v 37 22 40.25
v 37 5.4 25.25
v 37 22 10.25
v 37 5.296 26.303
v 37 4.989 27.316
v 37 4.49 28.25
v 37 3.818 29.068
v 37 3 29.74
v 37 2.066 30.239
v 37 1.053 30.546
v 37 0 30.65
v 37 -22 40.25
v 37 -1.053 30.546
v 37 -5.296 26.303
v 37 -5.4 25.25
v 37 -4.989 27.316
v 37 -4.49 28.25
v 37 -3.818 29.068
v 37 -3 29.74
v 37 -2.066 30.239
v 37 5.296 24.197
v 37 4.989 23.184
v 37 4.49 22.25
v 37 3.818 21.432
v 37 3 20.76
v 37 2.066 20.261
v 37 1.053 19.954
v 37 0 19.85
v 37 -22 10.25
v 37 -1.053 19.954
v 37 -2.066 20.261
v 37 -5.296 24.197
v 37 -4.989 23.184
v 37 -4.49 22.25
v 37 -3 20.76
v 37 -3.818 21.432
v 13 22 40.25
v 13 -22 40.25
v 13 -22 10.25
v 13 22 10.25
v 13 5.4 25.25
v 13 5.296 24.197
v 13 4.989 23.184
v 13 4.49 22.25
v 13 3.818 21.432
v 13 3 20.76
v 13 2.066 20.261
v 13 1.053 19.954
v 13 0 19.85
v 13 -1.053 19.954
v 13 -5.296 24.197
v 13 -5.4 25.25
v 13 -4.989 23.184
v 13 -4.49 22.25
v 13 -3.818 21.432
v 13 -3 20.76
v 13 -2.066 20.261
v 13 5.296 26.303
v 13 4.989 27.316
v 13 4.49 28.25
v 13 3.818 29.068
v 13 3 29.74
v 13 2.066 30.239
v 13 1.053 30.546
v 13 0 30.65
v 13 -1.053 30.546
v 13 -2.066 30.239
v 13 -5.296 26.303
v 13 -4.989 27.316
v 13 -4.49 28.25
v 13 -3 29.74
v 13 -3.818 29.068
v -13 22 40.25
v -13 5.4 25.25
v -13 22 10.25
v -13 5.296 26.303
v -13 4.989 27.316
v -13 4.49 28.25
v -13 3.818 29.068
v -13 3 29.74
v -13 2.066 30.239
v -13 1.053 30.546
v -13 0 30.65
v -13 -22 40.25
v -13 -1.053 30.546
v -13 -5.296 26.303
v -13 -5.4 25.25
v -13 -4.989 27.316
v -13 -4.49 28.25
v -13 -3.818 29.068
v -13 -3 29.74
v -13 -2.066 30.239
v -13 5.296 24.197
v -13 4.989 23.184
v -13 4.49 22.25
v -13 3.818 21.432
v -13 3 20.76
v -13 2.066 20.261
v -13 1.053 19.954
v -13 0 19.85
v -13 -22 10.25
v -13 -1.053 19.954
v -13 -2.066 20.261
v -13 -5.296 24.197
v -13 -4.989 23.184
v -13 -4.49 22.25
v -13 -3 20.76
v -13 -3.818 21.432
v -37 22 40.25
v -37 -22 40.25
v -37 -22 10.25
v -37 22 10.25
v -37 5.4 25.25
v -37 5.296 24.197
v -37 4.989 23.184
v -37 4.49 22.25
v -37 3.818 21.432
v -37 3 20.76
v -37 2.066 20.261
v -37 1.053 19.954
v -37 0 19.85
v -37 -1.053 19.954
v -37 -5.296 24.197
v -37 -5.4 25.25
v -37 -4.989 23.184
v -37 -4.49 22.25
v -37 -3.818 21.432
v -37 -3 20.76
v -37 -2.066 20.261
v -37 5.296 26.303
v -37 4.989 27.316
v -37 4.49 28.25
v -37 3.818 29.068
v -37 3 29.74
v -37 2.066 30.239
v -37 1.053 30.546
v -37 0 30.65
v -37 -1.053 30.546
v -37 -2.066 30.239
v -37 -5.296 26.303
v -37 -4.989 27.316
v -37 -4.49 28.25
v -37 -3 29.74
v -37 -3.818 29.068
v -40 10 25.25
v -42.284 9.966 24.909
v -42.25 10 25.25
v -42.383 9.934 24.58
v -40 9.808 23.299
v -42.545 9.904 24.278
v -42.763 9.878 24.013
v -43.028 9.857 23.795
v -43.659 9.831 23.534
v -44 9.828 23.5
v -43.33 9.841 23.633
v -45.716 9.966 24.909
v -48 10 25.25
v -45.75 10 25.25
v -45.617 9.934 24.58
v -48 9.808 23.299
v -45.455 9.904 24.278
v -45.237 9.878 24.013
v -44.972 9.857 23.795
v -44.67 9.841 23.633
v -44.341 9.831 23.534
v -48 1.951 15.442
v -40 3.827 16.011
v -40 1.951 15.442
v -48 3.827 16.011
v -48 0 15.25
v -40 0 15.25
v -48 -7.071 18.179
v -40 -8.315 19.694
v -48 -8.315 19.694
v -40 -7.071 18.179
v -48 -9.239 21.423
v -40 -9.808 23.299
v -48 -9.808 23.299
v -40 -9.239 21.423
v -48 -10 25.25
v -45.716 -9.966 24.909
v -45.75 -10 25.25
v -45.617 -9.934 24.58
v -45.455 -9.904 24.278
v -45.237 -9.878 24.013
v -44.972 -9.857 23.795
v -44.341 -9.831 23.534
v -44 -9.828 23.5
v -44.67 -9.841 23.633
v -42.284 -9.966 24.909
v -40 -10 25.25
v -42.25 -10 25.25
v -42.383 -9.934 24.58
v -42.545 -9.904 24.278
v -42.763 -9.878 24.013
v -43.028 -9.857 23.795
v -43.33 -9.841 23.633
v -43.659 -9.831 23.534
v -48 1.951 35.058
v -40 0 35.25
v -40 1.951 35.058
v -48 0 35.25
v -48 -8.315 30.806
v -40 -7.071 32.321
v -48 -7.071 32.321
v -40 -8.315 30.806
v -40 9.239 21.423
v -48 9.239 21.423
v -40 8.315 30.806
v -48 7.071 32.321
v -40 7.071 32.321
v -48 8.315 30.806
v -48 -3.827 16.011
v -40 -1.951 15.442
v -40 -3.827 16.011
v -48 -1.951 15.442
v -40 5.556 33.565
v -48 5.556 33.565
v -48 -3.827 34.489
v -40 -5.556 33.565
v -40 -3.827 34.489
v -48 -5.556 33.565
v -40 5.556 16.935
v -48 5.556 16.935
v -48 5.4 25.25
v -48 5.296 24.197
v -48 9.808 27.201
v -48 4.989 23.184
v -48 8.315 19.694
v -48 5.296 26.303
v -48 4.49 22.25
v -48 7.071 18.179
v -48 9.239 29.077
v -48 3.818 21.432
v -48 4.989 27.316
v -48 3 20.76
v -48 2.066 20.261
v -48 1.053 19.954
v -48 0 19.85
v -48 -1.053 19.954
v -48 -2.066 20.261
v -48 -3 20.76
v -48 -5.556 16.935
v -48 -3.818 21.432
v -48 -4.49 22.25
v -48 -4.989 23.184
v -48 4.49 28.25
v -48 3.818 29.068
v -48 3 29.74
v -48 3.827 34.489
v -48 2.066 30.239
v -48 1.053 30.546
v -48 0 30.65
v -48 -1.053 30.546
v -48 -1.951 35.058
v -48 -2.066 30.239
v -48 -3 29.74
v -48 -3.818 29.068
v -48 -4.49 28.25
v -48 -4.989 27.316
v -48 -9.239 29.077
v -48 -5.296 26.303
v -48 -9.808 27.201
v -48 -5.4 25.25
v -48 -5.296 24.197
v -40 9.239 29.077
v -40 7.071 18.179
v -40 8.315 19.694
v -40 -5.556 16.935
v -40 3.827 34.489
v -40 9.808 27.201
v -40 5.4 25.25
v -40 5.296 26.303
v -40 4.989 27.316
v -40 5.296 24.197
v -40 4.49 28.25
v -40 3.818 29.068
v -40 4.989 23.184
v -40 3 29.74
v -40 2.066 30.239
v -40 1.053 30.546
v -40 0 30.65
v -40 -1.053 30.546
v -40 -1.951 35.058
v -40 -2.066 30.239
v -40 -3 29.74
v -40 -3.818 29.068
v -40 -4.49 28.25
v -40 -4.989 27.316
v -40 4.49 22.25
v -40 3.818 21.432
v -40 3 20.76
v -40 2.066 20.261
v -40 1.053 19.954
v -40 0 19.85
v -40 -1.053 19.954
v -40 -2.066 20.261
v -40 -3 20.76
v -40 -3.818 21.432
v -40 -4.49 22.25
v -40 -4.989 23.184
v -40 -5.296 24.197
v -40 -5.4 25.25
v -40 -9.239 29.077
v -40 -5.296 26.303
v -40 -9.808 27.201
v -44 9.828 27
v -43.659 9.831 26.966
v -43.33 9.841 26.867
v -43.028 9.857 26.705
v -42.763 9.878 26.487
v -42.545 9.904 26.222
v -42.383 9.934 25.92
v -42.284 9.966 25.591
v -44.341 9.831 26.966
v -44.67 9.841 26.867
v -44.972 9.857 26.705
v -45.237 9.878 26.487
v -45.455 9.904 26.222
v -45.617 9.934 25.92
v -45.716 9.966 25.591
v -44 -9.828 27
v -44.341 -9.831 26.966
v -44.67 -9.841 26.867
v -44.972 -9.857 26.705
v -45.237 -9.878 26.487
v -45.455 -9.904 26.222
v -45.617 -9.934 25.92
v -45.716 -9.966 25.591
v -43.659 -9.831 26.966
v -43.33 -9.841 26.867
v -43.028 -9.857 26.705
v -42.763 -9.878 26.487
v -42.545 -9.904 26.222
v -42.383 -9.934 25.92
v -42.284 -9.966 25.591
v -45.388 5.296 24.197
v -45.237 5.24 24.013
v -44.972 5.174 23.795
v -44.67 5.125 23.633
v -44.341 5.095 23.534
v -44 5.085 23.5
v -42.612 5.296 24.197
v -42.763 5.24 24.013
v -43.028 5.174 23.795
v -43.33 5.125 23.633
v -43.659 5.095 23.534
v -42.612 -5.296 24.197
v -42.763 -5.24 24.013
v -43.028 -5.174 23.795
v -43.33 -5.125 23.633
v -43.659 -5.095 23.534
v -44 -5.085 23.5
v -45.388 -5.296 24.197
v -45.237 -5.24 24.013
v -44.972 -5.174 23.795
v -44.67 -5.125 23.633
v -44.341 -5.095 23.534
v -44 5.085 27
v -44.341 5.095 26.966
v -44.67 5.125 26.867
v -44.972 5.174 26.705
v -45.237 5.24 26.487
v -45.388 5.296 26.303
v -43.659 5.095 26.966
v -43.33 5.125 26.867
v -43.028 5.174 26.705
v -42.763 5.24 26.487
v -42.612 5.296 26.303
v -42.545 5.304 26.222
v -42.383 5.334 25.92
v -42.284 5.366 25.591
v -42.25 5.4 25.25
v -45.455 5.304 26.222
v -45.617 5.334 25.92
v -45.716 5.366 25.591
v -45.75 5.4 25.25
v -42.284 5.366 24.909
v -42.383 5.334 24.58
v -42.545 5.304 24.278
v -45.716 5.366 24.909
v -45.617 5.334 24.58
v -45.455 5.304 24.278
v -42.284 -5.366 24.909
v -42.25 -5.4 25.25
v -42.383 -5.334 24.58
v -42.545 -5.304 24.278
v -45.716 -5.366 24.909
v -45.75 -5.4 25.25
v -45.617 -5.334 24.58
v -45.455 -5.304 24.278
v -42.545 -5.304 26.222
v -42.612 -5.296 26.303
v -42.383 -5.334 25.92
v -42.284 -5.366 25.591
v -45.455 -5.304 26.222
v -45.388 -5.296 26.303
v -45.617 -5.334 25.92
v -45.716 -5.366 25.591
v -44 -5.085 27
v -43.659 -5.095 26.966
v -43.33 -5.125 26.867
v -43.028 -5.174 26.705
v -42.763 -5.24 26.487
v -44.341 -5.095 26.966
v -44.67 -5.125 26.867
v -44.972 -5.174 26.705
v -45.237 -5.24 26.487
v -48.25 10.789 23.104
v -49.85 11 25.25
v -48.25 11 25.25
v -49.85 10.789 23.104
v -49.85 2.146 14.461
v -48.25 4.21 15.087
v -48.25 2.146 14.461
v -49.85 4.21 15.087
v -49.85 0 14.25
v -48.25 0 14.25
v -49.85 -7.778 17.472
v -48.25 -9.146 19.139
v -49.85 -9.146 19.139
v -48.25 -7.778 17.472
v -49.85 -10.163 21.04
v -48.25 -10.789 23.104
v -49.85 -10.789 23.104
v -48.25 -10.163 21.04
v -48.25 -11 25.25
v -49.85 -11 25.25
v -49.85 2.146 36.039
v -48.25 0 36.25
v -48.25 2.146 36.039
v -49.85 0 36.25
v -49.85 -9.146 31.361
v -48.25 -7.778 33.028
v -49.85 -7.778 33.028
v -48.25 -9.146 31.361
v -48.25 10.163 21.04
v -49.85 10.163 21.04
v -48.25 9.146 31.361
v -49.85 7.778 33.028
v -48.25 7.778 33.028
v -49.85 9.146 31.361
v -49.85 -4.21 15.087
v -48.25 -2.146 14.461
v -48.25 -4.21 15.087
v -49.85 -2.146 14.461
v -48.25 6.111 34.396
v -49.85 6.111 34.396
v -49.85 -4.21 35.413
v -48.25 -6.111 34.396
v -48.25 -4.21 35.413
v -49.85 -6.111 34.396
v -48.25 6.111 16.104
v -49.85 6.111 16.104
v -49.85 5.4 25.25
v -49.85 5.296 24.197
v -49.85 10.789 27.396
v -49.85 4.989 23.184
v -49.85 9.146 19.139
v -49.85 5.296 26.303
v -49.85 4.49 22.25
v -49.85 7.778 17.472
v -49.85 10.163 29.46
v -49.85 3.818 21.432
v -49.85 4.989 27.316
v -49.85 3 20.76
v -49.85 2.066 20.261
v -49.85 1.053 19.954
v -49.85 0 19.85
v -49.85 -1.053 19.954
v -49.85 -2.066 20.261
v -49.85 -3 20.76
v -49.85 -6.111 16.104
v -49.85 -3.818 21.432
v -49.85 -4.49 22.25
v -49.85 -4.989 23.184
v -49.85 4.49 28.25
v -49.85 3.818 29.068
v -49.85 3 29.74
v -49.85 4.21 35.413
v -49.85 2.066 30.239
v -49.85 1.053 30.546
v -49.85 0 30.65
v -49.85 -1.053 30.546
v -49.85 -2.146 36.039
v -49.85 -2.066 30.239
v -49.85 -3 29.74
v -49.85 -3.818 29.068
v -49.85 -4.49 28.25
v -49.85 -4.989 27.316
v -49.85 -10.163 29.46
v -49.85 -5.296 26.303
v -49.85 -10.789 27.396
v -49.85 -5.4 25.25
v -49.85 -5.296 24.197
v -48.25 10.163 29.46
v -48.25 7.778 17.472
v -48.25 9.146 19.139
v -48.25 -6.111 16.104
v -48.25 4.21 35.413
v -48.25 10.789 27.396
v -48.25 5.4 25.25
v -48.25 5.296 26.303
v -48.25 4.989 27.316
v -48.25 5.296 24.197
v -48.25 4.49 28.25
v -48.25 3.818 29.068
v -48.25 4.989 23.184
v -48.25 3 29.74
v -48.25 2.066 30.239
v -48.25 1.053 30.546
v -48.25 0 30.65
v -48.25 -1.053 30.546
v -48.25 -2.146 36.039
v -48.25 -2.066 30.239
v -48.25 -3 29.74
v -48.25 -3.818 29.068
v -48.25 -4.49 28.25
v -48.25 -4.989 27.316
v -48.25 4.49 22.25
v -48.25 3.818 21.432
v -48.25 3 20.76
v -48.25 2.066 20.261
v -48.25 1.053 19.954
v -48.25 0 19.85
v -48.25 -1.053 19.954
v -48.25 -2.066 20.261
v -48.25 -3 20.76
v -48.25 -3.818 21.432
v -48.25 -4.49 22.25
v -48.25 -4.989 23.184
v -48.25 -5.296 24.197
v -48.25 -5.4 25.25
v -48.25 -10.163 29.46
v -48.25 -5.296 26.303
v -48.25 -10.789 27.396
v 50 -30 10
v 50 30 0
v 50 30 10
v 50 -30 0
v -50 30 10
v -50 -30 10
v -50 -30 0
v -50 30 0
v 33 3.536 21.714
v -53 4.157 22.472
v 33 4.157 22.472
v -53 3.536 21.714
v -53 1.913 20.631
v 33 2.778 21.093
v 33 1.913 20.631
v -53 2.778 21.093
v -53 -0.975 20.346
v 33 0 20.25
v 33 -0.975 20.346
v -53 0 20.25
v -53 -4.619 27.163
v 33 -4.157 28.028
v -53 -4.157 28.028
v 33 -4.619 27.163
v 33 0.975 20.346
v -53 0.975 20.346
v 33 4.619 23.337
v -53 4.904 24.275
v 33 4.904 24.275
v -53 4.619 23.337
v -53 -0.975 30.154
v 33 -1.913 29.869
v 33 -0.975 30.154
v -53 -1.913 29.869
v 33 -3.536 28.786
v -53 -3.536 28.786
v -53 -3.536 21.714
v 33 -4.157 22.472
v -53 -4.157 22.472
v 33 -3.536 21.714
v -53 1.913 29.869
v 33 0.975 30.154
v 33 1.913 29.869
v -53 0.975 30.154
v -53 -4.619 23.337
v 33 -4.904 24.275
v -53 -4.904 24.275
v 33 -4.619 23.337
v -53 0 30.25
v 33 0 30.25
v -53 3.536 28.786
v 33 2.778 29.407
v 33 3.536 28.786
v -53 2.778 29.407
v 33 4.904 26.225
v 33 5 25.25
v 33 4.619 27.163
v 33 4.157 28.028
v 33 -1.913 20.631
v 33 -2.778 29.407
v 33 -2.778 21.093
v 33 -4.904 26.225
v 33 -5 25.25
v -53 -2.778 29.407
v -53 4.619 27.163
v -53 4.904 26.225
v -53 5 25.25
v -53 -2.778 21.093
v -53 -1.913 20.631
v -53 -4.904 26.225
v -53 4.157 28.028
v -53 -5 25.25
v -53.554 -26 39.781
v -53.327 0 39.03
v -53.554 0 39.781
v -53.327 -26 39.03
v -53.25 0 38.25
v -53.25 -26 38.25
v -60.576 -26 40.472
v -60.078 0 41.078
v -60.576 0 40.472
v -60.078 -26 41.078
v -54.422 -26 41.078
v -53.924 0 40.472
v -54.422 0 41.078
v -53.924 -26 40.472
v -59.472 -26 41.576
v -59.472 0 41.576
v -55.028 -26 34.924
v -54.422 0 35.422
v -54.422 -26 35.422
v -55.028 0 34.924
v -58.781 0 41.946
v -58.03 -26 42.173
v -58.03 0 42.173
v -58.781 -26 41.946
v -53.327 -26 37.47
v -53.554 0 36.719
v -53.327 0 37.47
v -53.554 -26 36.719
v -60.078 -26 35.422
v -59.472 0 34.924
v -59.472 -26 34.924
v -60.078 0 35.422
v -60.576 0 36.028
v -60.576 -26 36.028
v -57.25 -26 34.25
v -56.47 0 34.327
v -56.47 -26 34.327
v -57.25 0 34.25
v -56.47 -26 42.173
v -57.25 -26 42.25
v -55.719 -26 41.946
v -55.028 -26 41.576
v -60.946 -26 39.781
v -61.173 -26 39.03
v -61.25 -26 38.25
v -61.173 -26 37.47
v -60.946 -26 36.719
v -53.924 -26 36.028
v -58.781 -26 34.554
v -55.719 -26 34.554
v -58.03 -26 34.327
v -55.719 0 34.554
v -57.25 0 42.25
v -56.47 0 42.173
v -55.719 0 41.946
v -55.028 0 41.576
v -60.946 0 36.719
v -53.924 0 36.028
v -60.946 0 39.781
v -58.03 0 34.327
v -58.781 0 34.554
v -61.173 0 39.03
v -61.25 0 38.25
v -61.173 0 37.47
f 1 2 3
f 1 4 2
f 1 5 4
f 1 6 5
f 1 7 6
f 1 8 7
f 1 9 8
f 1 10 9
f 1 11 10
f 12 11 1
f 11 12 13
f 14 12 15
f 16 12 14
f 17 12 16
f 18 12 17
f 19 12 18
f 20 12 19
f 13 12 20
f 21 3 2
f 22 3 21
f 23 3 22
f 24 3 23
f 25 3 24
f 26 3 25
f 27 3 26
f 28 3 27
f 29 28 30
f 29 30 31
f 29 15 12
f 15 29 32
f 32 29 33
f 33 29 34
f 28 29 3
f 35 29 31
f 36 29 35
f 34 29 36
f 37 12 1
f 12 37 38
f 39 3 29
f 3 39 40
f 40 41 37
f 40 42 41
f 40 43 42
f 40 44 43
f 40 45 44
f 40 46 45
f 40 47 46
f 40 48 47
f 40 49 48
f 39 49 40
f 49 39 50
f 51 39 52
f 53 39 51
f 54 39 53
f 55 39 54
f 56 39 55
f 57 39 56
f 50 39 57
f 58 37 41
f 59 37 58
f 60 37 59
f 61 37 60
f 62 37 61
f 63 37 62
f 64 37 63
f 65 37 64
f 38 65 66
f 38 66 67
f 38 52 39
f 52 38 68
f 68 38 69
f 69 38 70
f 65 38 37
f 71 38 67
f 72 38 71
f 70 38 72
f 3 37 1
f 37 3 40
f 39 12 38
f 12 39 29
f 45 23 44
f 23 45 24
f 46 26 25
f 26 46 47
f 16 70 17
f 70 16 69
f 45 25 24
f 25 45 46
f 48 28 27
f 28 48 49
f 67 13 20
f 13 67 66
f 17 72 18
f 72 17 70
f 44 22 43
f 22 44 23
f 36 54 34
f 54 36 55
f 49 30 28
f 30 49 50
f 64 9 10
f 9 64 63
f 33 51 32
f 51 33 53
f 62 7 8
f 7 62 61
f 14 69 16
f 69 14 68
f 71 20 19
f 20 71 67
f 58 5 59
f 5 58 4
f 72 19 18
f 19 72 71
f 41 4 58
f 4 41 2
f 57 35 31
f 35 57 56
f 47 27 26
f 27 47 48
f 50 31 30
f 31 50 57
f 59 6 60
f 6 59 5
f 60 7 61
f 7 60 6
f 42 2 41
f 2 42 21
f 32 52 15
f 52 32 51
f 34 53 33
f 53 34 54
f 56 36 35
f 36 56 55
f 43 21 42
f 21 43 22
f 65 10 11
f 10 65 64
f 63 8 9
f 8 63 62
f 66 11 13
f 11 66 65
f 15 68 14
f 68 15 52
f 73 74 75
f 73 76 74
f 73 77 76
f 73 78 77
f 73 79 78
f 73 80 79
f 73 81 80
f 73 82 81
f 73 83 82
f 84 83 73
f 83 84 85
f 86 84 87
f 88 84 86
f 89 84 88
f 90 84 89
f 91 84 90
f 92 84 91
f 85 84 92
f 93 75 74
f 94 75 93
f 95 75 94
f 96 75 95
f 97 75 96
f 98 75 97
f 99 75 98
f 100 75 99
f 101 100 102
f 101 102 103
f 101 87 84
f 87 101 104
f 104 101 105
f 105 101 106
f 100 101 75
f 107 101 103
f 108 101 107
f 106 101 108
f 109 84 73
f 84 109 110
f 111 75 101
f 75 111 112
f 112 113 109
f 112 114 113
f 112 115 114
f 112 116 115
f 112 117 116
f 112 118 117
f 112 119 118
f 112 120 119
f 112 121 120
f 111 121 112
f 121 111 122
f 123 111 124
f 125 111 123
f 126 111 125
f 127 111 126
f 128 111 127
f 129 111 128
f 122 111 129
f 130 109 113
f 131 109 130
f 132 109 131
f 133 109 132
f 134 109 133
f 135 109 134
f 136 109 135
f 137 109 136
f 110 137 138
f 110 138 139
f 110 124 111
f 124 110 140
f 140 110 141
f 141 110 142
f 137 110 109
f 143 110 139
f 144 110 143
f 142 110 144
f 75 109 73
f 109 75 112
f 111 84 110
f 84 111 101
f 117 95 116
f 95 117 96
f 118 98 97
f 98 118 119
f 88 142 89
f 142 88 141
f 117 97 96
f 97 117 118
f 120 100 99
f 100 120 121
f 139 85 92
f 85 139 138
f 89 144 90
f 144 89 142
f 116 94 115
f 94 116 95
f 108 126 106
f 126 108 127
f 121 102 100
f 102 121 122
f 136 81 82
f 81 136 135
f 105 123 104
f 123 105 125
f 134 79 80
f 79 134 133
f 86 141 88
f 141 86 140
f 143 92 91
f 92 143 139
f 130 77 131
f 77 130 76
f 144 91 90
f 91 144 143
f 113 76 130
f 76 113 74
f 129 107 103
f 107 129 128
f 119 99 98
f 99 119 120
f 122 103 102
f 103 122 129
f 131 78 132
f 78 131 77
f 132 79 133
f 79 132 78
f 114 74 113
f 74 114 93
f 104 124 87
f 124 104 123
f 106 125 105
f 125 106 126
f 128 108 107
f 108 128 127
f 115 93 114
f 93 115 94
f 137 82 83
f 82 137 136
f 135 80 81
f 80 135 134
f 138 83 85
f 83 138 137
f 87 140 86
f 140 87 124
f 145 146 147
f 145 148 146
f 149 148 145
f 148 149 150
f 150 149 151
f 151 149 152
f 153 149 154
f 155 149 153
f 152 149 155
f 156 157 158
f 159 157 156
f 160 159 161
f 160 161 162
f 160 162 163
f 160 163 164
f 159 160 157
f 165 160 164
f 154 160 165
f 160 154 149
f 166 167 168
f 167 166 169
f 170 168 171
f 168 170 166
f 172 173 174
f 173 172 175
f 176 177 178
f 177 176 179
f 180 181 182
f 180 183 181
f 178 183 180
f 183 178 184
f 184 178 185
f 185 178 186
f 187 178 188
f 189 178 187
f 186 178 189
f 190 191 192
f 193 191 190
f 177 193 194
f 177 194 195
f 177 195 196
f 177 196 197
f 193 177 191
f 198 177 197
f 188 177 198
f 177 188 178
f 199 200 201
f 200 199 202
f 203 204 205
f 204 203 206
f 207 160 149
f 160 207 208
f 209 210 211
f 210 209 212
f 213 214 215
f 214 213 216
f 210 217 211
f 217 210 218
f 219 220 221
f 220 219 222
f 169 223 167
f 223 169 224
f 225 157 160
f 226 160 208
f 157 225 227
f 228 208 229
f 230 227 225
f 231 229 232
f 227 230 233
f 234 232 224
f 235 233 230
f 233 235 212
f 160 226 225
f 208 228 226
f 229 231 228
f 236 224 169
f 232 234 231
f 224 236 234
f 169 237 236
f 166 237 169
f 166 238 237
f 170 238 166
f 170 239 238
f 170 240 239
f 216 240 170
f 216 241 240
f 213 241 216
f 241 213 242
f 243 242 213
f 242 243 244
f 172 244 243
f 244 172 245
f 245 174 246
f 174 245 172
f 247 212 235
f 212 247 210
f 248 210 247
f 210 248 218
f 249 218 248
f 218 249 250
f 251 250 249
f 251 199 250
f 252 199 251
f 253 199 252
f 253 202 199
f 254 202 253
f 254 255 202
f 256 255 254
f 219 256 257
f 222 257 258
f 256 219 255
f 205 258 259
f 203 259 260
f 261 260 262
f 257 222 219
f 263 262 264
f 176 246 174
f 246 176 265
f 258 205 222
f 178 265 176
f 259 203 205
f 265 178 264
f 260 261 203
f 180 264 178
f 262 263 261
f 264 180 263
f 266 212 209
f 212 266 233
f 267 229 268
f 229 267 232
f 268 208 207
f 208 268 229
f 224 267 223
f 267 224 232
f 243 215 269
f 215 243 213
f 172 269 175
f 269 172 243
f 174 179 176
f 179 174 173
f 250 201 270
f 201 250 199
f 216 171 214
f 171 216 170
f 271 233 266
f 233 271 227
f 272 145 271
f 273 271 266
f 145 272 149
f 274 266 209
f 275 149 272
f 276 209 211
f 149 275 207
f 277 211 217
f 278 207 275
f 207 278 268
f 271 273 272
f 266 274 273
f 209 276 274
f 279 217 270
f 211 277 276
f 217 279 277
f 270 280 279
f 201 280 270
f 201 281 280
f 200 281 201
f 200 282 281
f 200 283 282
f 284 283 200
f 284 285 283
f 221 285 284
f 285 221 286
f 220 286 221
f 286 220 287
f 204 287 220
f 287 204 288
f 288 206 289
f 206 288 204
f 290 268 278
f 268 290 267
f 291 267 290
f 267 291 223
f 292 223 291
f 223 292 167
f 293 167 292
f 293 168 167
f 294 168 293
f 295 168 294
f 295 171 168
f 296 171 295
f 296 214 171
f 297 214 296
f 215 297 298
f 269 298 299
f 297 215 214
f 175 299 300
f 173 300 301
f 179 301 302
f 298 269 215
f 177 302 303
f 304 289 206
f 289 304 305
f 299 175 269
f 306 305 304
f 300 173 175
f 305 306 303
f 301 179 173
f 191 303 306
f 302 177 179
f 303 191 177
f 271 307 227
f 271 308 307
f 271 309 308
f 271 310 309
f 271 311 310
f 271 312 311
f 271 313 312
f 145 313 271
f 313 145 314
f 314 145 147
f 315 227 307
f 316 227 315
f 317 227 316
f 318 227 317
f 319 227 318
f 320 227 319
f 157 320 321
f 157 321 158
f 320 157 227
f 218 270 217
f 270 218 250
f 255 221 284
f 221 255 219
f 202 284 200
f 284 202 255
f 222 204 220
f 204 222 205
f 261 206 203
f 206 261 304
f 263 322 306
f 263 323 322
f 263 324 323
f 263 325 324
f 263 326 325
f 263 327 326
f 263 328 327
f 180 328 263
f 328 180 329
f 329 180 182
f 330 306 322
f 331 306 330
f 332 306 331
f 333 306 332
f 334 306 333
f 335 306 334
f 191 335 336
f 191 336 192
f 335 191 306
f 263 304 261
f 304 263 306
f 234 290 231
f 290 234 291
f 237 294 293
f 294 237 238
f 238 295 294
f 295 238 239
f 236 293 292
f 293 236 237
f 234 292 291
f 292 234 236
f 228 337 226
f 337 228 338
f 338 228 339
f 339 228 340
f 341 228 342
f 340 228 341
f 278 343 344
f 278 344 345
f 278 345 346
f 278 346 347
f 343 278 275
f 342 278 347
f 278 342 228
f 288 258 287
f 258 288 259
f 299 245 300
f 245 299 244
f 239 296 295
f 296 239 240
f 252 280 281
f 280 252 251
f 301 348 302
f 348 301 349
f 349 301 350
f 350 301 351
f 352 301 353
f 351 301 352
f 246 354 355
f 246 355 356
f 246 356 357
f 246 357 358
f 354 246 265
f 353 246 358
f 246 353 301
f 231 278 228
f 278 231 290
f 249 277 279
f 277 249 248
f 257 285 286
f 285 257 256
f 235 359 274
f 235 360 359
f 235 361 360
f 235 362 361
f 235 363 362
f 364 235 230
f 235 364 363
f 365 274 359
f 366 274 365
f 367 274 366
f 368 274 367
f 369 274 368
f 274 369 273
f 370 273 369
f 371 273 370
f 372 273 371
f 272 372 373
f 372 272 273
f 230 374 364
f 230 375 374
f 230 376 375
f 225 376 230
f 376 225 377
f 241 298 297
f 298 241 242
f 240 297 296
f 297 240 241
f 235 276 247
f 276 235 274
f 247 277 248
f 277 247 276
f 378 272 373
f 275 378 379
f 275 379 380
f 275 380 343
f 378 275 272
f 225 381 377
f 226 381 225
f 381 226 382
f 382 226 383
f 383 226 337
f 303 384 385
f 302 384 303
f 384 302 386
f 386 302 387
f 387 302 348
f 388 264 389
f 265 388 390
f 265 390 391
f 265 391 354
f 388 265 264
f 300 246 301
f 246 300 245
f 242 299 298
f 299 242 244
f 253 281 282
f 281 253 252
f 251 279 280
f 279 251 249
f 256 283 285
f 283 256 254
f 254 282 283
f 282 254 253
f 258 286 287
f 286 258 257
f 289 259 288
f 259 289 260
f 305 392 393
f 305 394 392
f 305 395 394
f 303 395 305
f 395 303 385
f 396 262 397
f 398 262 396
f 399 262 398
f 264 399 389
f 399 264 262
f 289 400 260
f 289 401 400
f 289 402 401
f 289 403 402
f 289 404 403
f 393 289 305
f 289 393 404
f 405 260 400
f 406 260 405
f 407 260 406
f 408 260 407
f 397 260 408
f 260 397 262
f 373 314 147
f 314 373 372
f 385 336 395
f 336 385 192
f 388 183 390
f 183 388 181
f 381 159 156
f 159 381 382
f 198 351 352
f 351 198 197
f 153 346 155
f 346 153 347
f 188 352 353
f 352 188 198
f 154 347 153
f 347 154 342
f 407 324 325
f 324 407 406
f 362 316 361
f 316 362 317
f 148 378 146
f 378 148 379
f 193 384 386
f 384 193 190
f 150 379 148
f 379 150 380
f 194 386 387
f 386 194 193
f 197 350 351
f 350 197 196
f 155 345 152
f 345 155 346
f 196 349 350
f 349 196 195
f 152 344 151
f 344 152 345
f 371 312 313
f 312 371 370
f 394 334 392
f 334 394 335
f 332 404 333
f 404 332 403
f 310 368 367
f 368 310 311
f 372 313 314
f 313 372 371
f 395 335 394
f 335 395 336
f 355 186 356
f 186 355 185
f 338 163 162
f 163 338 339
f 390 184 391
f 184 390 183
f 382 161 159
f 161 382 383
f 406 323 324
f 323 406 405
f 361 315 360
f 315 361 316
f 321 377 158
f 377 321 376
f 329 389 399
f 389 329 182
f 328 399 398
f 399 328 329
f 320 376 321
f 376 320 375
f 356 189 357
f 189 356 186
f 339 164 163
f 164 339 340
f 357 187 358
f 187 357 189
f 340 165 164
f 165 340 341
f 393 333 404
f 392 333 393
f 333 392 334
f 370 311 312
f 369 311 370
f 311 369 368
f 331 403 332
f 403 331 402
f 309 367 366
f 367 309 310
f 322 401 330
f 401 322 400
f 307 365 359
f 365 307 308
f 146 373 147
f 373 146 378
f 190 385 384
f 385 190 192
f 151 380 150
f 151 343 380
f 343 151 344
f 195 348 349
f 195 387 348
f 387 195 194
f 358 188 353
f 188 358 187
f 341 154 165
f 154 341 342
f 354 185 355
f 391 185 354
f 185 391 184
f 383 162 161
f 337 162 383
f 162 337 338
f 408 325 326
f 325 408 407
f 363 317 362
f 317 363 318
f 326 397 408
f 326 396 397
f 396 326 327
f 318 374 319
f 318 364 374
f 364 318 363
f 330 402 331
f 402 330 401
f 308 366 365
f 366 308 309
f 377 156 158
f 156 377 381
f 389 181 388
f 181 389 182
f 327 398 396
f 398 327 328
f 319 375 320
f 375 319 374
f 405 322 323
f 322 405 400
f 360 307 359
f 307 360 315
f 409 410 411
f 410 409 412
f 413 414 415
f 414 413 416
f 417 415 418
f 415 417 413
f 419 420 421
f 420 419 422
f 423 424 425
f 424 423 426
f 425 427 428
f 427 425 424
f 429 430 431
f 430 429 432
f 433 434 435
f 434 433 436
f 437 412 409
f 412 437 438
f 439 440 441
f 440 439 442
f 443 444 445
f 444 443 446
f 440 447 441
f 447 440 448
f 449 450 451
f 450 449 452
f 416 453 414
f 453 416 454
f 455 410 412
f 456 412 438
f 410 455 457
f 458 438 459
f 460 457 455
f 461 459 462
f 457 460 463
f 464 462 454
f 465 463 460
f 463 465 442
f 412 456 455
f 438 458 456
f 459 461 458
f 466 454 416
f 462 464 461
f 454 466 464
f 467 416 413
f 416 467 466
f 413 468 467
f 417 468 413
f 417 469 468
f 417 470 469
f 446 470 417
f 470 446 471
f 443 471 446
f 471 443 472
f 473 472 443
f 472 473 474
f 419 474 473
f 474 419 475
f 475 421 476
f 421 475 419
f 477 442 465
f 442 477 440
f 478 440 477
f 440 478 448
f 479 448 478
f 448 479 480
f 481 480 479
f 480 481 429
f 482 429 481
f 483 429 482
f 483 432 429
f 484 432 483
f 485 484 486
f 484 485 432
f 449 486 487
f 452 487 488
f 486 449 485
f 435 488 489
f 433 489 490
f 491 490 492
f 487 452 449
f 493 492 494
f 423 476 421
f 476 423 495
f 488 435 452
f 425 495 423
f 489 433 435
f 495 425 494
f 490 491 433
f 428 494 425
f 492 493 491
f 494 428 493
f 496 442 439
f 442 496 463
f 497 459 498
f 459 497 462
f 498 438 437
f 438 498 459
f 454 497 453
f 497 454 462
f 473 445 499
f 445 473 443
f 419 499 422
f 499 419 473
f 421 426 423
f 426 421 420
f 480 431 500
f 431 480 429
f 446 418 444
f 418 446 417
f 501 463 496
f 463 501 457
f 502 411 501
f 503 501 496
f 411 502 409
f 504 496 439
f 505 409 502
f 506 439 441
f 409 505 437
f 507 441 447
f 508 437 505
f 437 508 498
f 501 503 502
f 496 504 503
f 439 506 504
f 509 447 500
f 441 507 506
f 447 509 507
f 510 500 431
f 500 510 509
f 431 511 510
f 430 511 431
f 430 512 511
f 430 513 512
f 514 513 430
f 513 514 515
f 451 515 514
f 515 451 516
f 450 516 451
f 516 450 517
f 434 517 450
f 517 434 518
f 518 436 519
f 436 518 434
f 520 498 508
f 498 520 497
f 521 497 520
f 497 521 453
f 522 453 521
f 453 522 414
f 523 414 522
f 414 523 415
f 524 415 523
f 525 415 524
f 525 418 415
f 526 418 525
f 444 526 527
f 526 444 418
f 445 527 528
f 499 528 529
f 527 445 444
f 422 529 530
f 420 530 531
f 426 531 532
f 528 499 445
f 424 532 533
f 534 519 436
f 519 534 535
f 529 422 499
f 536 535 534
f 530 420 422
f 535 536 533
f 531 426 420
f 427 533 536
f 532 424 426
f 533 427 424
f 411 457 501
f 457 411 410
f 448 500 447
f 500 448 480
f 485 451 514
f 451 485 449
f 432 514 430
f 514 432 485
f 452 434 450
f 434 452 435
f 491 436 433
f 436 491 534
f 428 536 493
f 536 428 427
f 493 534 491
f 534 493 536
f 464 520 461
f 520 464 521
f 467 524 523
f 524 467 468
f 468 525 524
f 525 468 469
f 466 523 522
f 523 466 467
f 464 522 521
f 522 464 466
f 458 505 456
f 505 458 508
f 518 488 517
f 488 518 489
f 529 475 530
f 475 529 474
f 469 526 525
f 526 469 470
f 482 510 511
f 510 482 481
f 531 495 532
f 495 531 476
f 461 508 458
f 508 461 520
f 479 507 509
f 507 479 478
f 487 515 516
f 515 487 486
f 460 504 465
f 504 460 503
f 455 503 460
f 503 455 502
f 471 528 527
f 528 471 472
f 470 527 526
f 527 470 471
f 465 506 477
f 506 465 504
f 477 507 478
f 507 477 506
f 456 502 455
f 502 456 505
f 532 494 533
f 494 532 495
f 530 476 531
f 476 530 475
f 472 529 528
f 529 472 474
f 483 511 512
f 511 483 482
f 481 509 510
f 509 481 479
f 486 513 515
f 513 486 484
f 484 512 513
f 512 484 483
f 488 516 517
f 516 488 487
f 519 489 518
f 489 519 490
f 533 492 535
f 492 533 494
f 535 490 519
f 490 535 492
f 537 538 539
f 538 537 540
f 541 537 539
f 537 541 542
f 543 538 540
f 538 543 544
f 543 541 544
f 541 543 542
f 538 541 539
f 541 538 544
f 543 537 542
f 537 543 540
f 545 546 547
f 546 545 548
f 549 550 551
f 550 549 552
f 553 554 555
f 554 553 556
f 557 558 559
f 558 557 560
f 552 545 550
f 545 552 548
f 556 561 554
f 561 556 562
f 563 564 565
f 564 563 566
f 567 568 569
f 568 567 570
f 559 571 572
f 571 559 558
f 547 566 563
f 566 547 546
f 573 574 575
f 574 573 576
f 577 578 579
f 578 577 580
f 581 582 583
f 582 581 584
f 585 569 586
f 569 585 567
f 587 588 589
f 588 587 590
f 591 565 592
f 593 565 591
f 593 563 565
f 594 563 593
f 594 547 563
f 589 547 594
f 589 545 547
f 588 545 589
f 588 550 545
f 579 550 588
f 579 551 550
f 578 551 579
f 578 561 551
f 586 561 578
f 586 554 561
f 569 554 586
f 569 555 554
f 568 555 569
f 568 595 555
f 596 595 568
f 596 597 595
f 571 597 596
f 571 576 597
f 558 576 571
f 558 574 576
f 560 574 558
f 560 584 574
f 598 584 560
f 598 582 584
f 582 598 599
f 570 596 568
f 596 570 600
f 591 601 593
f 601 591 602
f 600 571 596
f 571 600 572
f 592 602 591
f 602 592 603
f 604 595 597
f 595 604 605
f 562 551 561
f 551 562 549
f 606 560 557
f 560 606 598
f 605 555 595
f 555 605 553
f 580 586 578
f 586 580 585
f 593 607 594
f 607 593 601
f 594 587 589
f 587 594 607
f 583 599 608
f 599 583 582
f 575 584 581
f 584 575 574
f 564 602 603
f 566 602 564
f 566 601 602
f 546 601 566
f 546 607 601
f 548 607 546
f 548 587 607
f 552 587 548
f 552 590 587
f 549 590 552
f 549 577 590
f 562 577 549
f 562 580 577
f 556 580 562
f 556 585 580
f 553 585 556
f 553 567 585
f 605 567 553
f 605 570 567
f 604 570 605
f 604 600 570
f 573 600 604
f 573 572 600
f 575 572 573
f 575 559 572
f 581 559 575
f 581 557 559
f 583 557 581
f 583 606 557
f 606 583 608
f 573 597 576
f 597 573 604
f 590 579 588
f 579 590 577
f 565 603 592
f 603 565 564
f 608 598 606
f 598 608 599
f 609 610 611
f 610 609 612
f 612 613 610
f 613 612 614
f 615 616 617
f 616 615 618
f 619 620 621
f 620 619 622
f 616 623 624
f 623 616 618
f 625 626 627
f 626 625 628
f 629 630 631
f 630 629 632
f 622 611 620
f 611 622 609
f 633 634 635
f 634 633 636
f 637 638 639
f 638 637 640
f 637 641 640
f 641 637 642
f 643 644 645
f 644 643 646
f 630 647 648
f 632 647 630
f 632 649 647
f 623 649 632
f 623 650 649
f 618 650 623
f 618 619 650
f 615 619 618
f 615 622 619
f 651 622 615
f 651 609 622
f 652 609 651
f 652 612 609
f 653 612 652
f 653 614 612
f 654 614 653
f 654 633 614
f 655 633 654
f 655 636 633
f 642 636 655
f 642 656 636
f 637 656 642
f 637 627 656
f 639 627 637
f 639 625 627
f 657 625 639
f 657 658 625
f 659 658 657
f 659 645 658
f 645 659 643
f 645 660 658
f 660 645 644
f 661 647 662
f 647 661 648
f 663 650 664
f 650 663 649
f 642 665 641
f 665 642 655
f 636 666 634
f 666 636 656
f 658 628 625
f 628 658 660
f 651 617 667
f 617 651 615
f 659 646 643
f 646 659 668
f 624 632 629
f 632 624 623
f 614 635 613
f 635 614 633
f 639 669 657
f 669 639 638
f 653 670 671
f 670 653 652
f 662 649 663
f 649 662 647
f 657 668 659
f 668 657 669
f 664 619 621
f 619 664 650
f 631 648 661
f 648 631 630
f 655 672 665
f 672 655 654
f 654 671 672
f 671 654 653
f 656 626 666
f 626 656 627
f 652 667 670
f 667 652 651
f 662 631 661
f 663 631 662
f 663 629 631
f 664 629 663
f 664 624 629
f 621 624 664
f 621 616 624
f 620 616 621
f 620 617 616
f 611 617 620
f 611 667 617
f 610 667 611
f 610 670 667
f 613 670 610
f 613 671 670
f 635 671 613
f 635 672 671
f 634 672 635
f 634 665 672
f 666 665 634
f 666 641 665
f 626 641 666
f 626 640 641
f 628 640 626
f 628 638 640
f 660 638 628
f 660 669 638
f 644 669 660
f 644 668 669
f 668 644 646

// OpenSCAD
$fn = 32;

// ------------------------------------------------------------------------
// Machine vise: screw d10, jaws 24 x 30 mm
// Every part is its own module, assembly() places every instance.
// ------------------------------------------------------------------------

// --- part 1 ---
module vise_bed() {
  difference() {
    translate([-50, -30, 0]) cube([100, 60, 10]);
  }
}

// --- part 2 ---
module vise_jaw() {
  difference() {
    translate([-12, -22, 0]) cube([24, 44, 30]);
    translate([0, 0, 15]) rotate([0, 90, 0]) cylinder(h = 26, d = 10.8, center = true);
  }
}

// --- part 3 ---
module vise_screw() {
  translate([0, 0, -43]) cylinder(h = 86, d = 10);
}

// --- part 4 ---
module screw_collar() {
  difference() {
    cylinder(h = 8, d = 20);
    translate([0, 0, -1]) cylinder(h = 10, d = 10.8);
    translate([0, 0, 4]) rotate([90, 0, 0]) cylinder(h = 22, d = 3.5, center = true);
  }
}

// --- part 5 ---
module screw_washer() {
  difference() {
      translate([0, 0, 0]) cylinder(h = 1.6, d = 22);
      translate([0, 0, -1]) cylinder(h = 3.6, d = 10.8);
    }
}

// --- part 6 ---
module vise_handle() {
  cylinder(h = 26, d = 8);
}

// --- assembly ---
module assembly() {
  color([0.80, 0.24, 0.20]) translate([0, 0, 0]) rotate([0, 0, 0]) vise_bed();
  color([0.20, 0.45, 0.75]) translate([25, 0, 10.25]) rotate([0, 0, 0]) vise_jaw();
  color([0.25, 0.62, 0.32]) translate([-25, 0, 10.25]) rotate([0, 0, 0]) vise_jaw();
  color([0.92, 0.70, 0.18]) translate([-10, 0, 25.25]) rotate([0, 90, 0]) vise_screw();
  color([0.58, 0.35, 0.70]) translate([-48, 0, 25.25]) rotate([0, 90, 0]) screw_collar();
  color([0.16, 0.66, 0.66]) translate([-49.85, 0, 25.25]) rotate([0, 90, 0]) screw_washer();
  color([0.85, 0.48, 0.18]) translate([-57.25, 0, 38.25]) rotate([90, 0, 0]) vise_handle();
}

assembly();
